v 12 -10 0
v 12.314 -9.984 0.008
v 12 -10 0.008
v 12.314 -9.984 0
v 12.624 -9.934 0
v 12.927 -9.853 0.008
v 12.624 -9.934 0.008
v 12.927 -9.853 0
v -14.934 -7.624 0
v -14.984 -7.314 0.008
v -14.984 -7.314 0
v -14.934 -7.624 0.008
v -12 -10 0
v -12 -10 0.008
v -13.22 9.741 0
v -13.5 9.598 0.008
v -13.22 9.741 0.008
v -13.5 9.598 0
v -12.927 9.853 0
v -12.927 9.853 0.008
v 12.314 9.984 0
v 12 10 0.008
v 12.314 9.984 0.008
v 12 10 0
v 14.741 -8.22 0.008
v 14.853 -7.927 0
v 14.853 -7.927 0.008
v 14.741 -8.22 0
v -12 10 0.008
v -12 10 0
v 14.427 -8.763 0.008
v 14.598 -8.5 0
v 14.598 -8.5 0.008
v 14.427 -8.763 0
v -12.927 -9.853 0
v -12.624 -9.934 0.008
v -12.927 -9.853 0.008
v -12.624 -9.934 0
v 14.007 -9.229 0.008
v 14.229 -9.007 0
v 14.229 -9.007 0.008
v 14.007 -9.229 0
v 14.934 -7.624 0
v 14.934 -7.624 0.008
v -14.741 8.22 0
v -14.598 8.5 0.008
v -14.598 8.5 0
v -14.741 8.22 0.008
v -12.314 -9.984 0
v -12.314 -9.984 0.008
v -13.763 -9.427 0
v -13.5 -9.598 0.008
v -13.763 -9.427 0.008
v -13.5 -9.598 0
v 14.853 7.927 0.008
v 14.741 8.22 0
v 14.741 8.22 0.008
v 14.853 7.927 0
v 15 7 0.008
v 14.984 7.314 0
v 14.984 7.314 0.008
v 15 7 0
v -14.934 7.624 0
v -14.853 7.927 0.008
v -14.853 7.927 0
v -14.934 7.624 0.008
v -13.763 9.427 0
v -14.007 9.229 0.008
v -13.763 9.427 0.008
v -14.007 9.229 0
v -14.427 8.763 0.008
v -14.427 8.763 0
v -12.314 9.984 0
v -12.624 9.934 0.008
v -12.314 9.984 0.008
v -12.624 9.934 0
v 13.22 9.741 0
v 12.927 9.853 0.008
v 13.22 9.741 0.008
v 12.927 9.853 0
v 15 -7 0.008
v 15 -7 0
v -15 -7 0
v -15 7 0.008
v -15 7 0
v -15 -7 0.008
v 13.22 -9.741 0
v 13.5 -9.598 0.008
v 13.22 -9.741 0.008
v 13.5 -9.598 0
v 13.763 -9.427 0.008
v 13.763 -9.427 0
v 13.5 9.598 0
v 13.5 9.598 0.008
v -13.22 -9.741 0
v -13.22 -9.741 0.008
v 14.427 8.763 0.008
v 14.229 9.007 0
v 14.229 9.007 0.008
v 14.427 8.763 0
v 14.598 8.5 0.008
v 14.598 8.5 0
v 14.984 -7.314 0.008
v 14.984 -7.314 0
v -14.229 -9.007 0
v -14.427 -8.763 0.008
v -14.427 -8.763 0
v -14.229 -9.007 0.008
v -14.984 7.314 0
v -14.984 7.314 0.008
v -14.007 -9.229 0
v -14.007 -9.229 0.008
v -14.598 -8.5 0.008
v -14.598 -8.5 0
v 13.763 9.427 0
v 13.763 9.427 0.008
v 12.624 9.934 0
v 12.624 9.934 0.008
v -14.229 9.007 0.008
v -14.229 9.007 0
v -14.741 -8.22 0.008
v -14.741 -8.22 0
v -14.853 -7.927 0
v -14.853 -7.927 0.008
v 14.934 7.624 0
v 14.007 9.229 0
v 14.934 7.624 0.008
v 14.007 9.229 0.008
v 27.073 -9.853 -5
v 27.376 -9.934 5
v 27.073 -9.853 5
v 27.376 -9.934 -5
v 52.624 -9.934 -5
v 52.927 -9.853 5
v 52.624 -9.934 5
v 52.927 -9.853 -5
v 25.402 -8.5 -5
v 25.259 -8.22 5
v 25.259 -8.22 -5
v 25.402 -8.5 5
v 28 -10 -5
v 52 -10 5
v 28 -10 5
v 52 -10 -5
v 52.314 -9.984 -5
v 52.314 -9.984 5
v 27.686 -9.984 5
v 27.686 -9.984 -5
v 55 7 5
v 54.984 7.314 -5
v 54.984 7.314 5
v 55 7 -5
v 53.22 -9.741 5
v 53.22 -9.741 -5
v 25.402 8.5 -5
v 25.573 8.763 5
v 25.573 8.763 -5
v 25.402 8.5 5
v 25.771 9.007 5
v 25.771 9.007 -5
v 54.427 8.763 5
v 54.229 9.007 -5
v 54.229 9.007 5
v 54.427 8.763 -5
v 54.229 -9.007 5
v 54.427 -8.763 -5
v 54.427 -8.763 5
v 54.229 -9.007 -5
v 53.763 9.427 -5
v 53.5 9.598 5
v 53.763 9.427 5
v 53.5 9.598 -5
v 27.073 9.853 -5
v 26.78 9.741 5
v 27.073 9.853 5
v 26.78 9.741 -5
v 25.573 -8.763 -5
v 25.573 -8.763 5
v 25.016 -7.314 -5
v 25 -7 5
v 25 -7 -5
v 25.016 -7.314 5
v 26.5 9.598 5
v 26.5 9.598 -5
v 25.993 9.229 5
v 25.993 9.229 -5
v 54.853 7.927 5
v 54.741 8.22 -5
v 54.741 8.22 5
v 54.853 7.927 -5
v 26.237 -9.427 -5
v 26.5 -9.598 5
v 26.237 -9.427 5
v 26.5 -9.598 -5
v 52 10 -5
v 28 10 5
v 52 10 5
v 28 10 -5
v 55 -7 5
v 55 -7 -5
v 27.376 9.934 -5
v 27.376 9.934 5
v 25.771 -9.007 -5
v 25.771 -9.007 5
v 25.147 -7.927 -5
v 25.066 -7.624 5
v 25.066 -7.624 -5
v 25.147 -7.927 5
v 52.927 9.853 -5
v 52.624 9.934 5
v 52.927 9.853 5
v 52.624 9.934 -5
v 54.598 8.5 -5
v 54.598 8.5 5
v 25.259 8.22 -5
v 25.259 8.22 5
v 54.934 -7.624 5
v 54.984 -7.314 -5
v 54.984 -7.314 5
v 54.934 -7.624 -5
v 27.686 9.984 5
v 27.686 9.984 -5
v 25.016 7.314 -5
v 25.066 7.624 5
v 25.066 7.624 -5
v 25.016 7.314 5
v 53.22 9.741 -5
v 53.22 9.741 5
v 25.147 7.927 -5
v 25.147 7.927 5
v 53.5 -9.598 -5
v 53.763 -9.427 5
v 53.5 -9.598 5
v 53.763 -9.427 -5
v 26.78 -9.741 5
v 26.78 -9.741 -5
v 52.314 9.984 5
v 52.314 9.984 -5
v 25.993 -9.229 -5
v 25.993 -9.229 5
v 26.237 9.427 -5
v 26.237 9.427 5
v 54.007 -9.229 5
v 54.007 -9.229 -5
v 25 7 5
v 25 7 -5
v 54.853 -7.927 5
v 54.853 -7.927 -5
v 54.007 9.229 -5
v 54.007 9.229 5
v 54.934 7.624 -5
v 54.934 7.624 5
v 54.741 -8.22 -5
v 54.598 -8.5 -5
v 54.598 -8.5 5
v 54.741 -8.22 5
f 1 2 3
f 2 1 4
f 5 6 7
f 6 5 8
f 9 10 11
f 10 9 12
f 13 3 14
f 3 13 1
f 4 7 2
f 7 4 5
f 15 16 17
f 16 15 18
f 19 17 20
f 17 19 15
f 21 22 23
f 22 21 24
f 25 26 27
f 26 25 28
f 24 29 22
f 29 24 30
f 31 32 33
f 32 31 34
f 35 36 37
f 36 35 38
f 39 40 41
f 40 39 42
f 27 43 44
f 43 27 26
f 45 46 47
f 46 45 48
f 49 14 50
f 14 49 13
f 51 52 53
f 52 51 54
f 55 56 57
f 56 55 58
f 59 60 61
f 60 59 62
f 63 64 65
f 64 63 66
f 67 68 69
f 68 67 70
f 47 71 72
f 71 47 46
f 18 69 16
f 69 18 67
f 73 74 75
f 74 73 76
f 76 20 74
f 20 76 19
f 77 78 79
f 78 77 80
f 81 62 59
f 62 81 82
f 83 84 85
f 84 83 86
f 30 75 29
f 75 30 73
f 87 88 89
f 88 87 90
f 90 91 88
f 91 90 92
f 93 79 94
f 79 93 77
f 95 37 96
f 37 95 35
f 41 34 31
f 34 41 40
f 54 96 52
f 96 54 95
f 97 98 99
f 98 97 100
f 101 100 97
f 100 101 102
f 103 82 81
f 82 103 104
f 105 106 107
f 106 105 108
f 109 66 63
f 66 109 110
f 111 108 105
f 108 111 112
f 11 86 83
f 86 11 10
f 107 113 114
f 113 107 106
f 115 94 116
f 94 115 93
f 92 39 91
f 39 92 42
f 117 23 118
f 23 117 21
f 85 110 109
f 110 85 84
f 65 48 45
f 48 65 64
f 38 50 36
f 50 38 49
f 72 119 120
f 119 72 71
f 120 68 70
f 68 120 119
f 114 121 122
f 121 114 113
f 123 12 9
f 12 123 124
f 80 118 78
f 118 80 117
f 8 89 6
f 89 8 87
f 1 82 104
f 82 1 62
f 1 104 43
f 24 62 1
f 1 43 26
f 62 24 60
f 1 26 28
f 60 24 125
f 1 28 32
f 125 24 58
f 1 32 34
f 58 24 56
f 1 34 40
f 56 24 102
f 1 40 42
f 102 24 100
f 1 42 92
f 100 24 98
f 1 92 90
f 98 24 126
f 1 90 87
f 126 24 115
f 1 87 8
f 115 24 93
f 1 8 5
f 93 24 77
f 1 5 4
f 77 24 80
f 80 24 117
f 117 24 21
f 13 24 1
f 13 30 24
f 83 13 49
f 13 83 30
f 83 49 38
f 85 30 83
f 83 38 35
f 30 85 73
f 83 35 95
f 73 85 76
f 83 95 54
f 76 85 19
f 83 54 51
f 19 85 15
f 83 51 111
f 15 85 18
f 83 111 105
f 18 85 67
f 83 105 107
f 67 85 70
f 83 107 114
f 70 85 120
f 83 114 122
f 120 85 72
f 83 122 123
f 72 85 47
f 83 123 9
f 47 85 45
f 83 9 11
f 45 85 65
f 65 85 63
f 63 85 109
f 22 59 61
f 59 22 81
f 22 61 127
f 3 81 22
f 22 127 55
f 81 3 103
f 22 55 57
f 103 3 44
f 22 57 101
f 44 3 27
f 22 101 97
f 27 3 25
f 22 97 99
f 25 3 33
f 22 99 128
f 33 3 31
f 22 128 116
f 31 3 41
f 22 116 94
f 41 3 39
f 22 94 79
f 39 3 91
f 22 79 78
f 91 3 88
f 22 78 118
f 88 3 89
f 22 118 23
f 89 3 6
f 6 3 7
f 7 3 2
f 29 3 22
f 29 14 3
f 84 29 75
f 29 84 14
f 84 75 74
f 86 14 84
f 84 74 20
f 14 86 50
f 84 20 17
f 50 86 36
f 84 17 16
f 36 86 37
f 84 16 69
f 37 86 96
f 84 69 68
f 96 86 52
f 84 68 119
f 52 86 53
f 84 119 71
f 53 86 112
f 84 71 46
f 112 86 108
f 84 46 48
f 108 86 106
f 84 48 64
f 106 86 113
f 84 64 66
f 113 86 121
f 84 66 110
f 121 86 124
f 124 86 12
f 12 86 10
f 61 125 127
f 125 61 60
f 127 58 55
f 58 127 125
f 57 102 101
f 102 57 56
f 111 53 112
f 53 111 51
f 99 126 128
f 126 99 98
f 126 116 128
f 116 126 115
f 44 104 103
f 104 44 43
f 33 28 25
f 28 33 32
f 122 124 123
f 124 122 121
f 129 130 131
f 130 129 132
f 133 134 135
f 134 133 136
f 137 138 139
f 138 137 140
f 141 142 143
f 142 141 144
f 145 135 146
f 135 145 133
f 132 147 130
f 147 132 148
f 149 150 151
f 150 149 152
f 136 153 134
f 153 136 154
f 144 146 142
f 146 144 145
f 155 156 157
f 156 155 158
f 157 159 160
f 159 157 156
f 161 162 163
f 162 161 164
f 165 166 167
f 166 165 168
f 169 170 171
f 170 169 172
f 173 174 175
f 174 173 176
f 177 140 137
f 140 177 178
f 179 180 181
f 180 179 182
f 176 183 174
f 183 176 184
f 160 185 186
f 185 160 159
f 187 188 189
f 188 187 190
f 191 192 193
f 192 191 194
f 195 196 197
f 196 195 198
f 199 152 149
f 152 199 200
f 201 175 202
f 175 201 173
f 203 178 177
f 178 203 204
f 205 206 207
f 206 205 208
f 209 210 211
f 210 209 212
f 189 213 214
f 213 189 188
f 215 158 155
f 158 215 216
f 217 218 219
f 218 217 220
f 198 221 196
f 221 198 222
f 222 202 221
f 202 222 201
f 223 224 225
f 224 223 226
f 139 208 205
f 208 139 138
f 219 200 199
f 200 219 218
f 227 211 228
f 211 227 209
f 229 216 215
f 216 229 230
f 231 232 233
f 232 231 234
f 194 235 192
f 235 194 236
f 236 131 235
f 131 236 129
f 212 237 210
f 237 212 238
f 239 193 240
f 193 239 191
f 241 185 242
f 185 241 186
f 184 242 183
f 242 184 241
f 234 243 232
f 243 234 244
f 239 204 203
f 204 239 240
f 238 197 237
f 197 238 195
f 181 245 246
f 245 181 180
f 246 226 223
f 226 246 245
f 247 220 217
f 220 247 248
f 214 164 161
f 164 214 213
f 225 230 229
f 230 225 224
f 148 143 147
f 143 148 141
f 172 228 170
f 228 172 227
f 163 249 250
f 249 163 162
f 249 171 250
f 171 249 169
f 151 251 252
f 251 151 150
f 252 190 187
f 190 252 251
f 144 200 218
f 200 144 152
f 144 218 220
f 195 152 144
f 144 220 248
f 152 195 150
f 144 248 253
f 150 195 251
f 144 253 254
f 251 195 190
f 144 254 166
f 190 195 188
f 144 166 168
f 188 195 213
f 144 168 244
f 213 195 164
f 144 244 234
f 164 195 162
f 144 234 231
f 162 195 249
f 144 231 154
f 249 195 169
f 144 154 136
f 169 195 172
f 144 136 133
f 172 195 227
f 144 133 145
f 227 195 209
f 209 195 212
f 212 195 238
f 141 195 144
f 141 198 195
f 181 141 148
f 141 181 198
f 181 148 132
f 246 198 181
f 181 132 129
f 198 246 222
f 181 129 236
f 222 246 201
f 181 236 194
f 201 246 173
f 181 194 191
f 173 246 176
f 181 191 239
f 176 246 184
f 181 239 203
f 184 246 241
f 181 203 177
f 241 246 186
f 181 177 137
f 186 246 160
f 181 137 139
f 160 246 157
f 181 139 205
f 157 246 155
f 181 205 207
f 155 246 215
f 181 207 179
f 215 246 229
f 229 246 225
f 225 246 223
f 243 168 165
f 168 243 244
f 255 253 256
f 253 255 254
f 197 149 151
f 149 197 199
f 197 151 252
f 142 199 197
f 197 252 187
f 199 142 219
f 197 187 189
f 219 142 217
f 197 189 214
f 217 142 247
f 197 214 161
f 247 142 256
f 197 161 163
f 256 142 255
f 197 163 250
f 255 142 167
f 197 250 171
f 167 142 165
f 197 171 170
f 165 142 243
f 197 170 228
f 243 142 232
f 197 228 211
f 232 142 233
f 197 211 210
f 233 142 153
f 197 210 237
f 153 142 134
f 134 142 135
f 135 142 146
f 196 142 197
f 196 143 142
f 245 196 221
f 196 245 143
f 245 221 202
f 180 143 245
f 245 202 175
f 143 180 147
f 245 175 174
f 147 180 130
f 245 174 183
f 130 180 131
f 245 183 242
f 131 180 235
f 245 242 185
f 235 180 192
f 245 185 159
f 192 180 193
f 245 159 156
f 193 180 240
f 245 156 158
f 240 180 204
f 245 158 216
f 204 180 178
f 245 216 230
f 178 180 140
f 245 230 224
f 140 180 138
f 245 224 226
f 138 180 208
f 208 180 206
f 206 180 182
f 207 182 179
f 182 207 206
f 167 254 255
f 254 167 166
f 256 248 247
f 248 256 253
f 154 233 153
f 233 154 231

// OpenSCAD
// file: ../utils/core/clip.scad
//
// NopSCADlib Copyright Chris Palmer 2018
// nop.head@gmail.com
// hydraraptor.blogspot.com
//
// This file is part of NopSCADlib.
//
// NopSCADlib is free software: you can redistribute it and/or modify it under the terms of the
// GNU General Public License as published by the Free Software Foundation, either version 3 of
// the License, or (at your option) any later version.
//
// NopSCADlib is distributed in the hope that it will be useful, but WITHOUT ANY WARRANTY;
// without even the implied warranty of MERCHANTABILITY or FITNESS FOR A PARTICULAR PURPOSE.
// See the GNU General Public License for more details.
//
// You should have received a copy of the GNU General Public License along with NopSCADlib.
// If not, see <https://www.gnu.org/licenses/>.
//

//
//! Construct arbirarily large box to partition 3D space and clip objects, useful for creating cross sections to see the inside when debugging.
//!
//! Original version by Doug Moen on the OpenSCAD forum
//
//
module box(xmin, ymin, zmin, xmax, ymax, zmax) //! Construct a box given its bounds
    polyhedron(
        [[xmin, ymin, zmin],  // 0
         [xmin, ymin, zmax],  // 1
         [xmin, ymax, zmin],  // 2
         [xmin, ymax, zmax],  // 3
         [xmax, ymin, zmin],  // 4
         [xmax, ymin, zmax],  // 5
         [xmax, ymax, zmin],  // 6
         [xmax, ymax, zmax]], // 7
        [[7,5,1,3],  // top
         [2,0,4,6],  // bottom
         [5,4,0,1],  // front
         [3,2,6,7],  // back
         [5,7,6,4],  // right
         [0,2,3,1]]  // left
    );

module clip(xmin = -inf, ymin = -inf, zmin = -inf, xmax = inf, ymax = inf, zmax = inf) //! Clip child to specified boundaries
    render() intersection() {
        children();

        box(xmin, ymin, zmin, xmax, ymax, zmax);
    }
// file: ../utils/core/rounded_rectangle.scad
//
// NopSCADlib Copyright Chris Palmer 2018
// nop.head@gmail.com
// hydraraptor.blogspot.com
//
// This file is part of NopSCADlib.
//
// NopSCADlib is free software: you can redistribute it and/or modify it under the terms of the
// GNU General Public License as published by the Free Software Foundation, either version 3 of
// the License, or (at your option) any later version.
//
// NopSCADlib is distributed in the hope that it will be useful, but WITHOUT ANY WARRANTY;
// without even the implied warranty of MERCHANTABILITY or FITNESS FOR A PARTICULAR PURPOSE.
// See the GNU General Public License for more details.
//
// You should have received a copy of the GNU General Public License along with NopSCADlib.
// If not, see <https://www.gnu.org/licenses/>.
//

//
//! Rectangle with rounded corners.
//
module rounded_square(size, r, center = true) //! Like ```square()``` but with with rounded corners
{
    $fn = r2sides4n(r);
    offset(r) offset(-r) square(size, center = center);
}

module rounded_rectangle(size, r, center = true, xy_center = true) //! Like ```cube()``` but corners rounded in XY plane and separate centre options for xy and z.
{
    linear_extrude(size[2], center = center)
        rounded_square([size[0], size[1]], r, xy_center);
}
// file: ../utils/core/teardrops.scad
//
// NopSCADlib Copyright Chris Palmer 2018
// nop.head@gmail.com
// hydraraptor.blogspot.com
//
// This file is part of NopSCADlib.
//
// NopSCADlib is free software: you can redistribute it and/or modify it under the terms of the
// GNU General Public License as published by the Free Software Foundation, either version 3 of
// the License, or (at your option) any later version.
//
// NopSCADlib is distributed in the hope that it will be useful, but WITHOUT ANY WARRANTY;
// without even the implied warranty of MERCHANTABILITY or FITNESS FOR A PARTICULAR PURPOSE.
// See the GNU General Public License for more details.
//
// You should have received a copy of the GNU General Public License along with NopSCADlib.
// If not, see <https://www.gnu.org/licenses/>.
//

//
//! For making horizontal holes that don't need support material.
//! Small holes can get away without it, but they print better with truncated teardrops.
//
module teardrop(h, r, center = true, truncate = true, chamfer = 0) { //! For making horizontal holes that don't need support material, set ```truncate = false``` to make traditional RepRap teardrops that don't even need bridging
    module teardrop_2d(r, truncate) {
        hull() {
            circle4n(r);
            if(truncate)
                translate([0, r / 2])
                    square([2 * r * (sqrt(2) - 1), r], center = true);
            else
                polygon([[0, 0], [eps, 0], [0, r * sqrt(2)]]);
        }
    }

    render(convexity = 5)
        extrude_if(h, center)
            teardrop_2d(r, truncate);

    teardrop_chamfer(h, center, chamfer) {
        linear_extrude(eps, center = true)
            teardrop_2d(r + chamfer / 2, truncate);
        translate_z(-chamfer / 2)
            linear_extrude(eps, center = true)
                teardrop_2d(r, truncate);
    }
}

module semi_teardrop(h, r, d = undef, center = true, chamfer = 0) { //! A semi teardrop in the positive Y domain
    module semi_teardrop_2d(r, d) {
        intersection() {
            R = is_undef(d) ? r : d / 2;
            teardrop(r = R, h = 0);

            sq = R + 1;
            translate([-sq, 0])
                square([2 * sq, sq]);
        }
    }

    render(convexity = 5)
        extrude_if(h, center)
            semi_teardrop_2d(r, d);

    teardrop_chamfer(h, center, chamfer) {
        linear_extrude(eps, center = true)
            semi_teardrop_2d(r + chamfer / 2, d);
        translate_z(-chamfer / 2)
            linear_extrude(eps, center = true)
                semi_teardrop_2d(r, d);
    }
}

module teardrop_plus(h, r, center = true, truncate = true, chamfer = 0) //! Slightly bigger teardrop to allow for the 3D printing staircase effect
    teardrop(h, r + layer_height / 4, center, truncate, chamfer);

module tearslot(h, r, w, center = true, chamfer = 0) { //! A horizontal slot that doesn't need support material
    module tearslot_2d(r, w) {
        hull() {
            translate([-w / 2, 0]) teardrop(r = r, h = 0);
            translate([w / 2, 0]) teardrop(r = r, h = 0);
        }
    }

    extrude_if(h, center)
        tearslot_2d(r, w);

    teardrop_chamfer(h, center, chamfer) {
        linear_extrude(eps, center = true)
            tearslot_2d(r + chamfer / 2, w);
        translate_z(-chamfer / 2)
            linear_extrude(eps, center = true)
                tearslot_2d(r, w);
    }
}

module vertical_tearslot(h, r, l, center = true, chamfer = 0) { //! A vertical slot that doesn't need support material
    module vertical_tearslot_2d(r, l) {
        hull() {
            translate([0,  l / 2]) teardrop(0, r, true);
            translate([0, -l / 2]) circle4n(r);
        }
    }

    extrude_if(h, center)
        vertical_tearslot_2d(r, l);

    teardrop_chamfer(h, center, chamfer) {
        linear_extrude(eps, center = true)
            vertical_tearslot_2d(r + chamfer / 2, l);
        translate_z(-chamfer / 2)
            linear_extrude(eps, center = true)
                vertical_tearslot_2d(r, l);
    }
}

module teardrop_chamfer(h, center, chamfer) { //! Helper module for adding chamfer to a teardrop
    if(h && chamfer)
        translate_z(center ? 0 : h / 2)
            for(m = [0, 1])
                mirror([0, 0, m])
                    translate_z((h - eps ) / 2)
                        hull()
                            children();
}
// file: ../utils/core/polyholes.scad
//
// NopSCADlib Copyright Chris Palmer 2018
// nop.head@gmail.com
// hydraraptor.blogspot.com
//
// This file is part of NopSCADlib.
//
// NopSCADlib is free software: you can redistribute it and/or modify it under the terms of the
// GNU General Public License as published by the Free Software Foundation, either version 3 of
// the License, or (at your option) any later version.
//
// NopSCADlib is distributed in the hope that it will be useful, but WITHOUT ANY WARRANTY;
// without even the implied warranty of MERCHANTABILITY or FITNESS FOR A PARTICULAR PURPOSE.
// See the GNU General Public License for more details.
//
// You should have received a copy of the GNU General Public License along with NopSCADlib.
// If not, see <https://www.gnu.org/licenses/>.
//

//
//! A method of making 3D printed holes come out the right size regardless of the printer, providing
//! it gets the linear dimensions right. See <https://hydraraptor.blogspot.com/2011/02/polyholes.html>
//!
//! The module provides `poly_circle()`, `poly_cylinder()` and `poly_ring()` that is useful for making printed washers and pillars.
//
function sides(r) = max(round(4 * r), 3);                                       //! Optimium number of sides for specified radius
function corrected_radius(r, n = 0)   = r / cos(180 / (n ? n : sides(r)));      //! Adjusted radius to make flats lie on the circle
function corrected_diameter(d, n = 0) = d / cos(180 / (n ? n : sides(d / 2)));  //! Adjusted diameter to make flats lie on the circle

module poly_circle(r, sides = 0) { //! Make a circle adjusted to print the correct size
    n = sides ? sides : sides(r);
    circle(r = corrected_radius(r,n), $fn = n);
}

module poly_cylinder(r, h, center = false, sides = 0) //! Make a cylinder adjusted to print the correct size
    extrude_if(h, center)
        poly_circle(r, sides);

module poly_ring(or, ir) { //! Make a 2D ring adjusted to have the correct internal radius
    cir = corrected_radius(ir);
    filaments = (or - cir) / extrusion_width;
    if(filaments > 3 + eps)
        difference() {
            circle(or);

            poly_circle(ir);
        }
    else
        if(filaments >= 2)
            difference() {
                offset(or - cir)
                    poly_circle(ir);

                poly_circle(ir);
            }
            else
                difference() {
                    poly_circle(or);

                    offset(-squeezed_wall)
                        poly_circle(or);
                }
}

module poly_tube(or, ir, h, center = false) //! Make a tube adjusted to have the correct internal radius
    extrude_if(h, center)
        poly_ring(or, ir);

module drill(r, h = 100) //! Make a cylinder for drilling holes suitable for CNC routing, set h = 0 for circle
    extrude_if(h)
        circle(r = corrected_radius(r, r2sides(r)));
//
// Horizontal slot
//
module slot(r, l, h = 100) //! Make a horizontal slot suitable for CNC routing, set h = 0 for 2D version
    extrude_if(h)
        hull() {
            translate([l / 2,0])
                drill(r, 0);

            translate([-l / 2,0])
                drill(r, 0);
        }
// file: ../utils/core/bom.scad
//
// NopSCADlib Copyright Chris Palmer 2018
// nop.head@gmail.com
// hydraraptor.blogspot.com
//
// This file is part of NopSCADlib.
//
// NopSCADlib is free software: you can redistribute it and/or modify it under the terms of the
// GNU General Public License as published by the Free Software Foundation, either version 3 of
// the License, or (at your option) any later version.
//
// NopSCADlib is distributed in the hope that it will be useful, but WITHOUT ANY WARRANTY;
// without even the implied warranty of MERCHANTABILITY or FITNESS FOR A PARTICULAR PURPOSE.
// See the GNU General Public License for more details.
//
// You should have received a copy of the GNU General Public License along with NopSCADlib.
// If not, see <https://www.gnu.org/licenses/>.
//

//
//! Bill Of Materials generation via echo and the ```bom.py``` script. Also handles exploded assembly views and posing. Assembly instructions can precede the module
//! definition that makes the assembly.
//!
//! The example below shows how to define a vitamin and incorporate it into an assembly with sub-assemblies and make an exploded view. The resulting flat BOM is shown but
//! heirachical BOMs are also generated for real projects.
//
function bom_mode(n = 1) = $_bom >= n && (is_undef($on_bom) || $on_bom);  //! Current BOM mode, 0 = none, 1 = printed and routed parts and assemblies, 2 includes vitamins as well
function exploded() = is_undef($exploded_parent) ? $exploded : 0;   //! Returns the value of ```$exploded``` if it is defined, else ```0```
function show_supports() = !$preview || exploded();                 //! True if printed support material should be shown

module no_explode() let($exploded_parent = true) children();        //! Prevent children being exploded
module no_pose() let($posed = true) children();                     //! Force children not to be posed even if parent is

module explode(d, explode_children = false, offset = [0,0,0]) {     //! Explode children by specified Z distance or vector ```d```, option to explode grand children
    v = is_list(d) ? d : [0, 0, d];
    o = is_list(offset) ? offset : [0, 0, offset];
    if($exploded && is_undef($exploded_parent) && norm(v)) {
        translate(o)                                                // Draw the line first in case the child is transparent
            color("yellow") hull() {
                sphere(0.2);

                translate(v * $exploded)
                    sphere(0.2);
            }

        translate(v * $exploded)
            let($exploded_parent = explode_children ? undef : true)
                children();
    }
    else
        children();
}

module pose(a = [55, 0, 25], t = [0, 0, 0], exploded = undef)       //! Pose an STL or assembly for rendering to png by specifying rotation ```a``` and translation ```t```, ```exploded = true for``` just the exploded view or ```false``` for unexploded only.
    if(is_undef($pose) || !is_undef($posed) || (!is_undef(exploded) && exploded != !!exploded()))
        children();
    else
        let($posed = true) // only pose the top level
            rotate([55, 0, 25])
                rotate([-a.x, 0, 0])
                    rotate([0, -a.y, 0])
                        rotate([0, 0, -a.z])
                            translate(-t)
                                children();

module pose_hflip(exploded = undef)       //! Pose an STL or assembly for rendering to png by flipping around the Y axis, ```exploded = true for``` just the exploded view or ```false``` for unexploded only.
    if(is_undef($pose) || !is_undef($posed) || (!is_undef(exploded) && exploded != !!exploded()))
        children();
    else
        let($posed = true) // only pose the top level
            hflip()
                children();

module pose_vflip(exploded = undef)       //! Pose an STL or assembly for rendering to png by flipping around the X axis, ```exploded = true for``` just the exploded view or ```false``` for unexploded only.
    if(is_undef($pose) || !is_undef($posed) || (!is_undef(exploded) && exploded != !!exploded()))
        children();
    else
        let($posed = true) // only pose the top level
            vflip()
                children();


module assembly(name) {                 //! Name an assembly that will appear on the BOM, there needs to a module named ```<name>_assembly``` to make it
    if(bom_mode())
        echo(str("~", name, "_assembly{"));

    no_pose()
        if(is_undef($child_assembly))
            let($child_assembly = true)
                children();
        else
            no_explode()
                children();

    if(bom_mode())
        echo(str("~}", name, "_assembly"));
}

module stl(name) {                      //! Name an stl that will appear on the BOM, there needs to a module named ```<name>_stl``` to make it
    if(bom_mode())
        echo(str("~", name, ".stl"));
}

module dxf(name) {                      //! Name a dxf that will appear on the BOM, there needs to a module named ```<name>_dxf``` to make it
    if(bom_mode())
        echo(str("~", name, ".dxf"));
}

function value_string(value) = is_string(value) ? str("\"", value, "\"") : str(value); //! Convert ```value``` to a string or quote it if it is already a string

function arg(value, default, name = "") =   //! Create string for arg if not default, helper for ```vitamin()```
    value == default ? ""
                     : name ? str(", ", name, " = ", value_string(value))
                            : str(", ", value_string(value));

module vitamin(description) {                //! Describe a vitamin for the BOM entry and precede it with a module call that creates it, eg. "wigit(42): Type 42 widget"
    if(bom_mode(2))
        echo(str("~", description, !is_undef($hidden) ? " - not shown" : ""));
}

module not_on_bom(on = false)               //! Specify the following child parts are not on the BOM, for example when they are on a PCB that comes assembled
    let($on_bom = on)
        children();

module hidden()                             //! Make item invisible, except on the BOM
    scale(1 / sqr(1024))
        let($hidden = true)
            children();
// file: ../utils/core/sphere.scad
//
// NopSCADlib Copyright Chris Palmer 2018
// nop.head@gmail.com
// hydraraptor.blogspot.com
//
// This file is part of NopSCADlib.
//
// NopSCADlib is free software: you can redistribute it and/or modify it under the terms of the
// GNU General Public License as published by the Free Software Foundation, either version 3 of
// the License, or (at your option) any later version.
//
// NopSCADlib is distributed in the hope that it will be useful, but WITHOUT ANY WARRANTY;
// without even the implied warranty of MERCHANTABILITY or FITNESS FOR A PARTICULAR PURPOSE.
// See the GNU General Public License for more details.
//
// You should have received a copy of the GNU General Public License along with NopSCADlib.
// If not, see <https://www.gnu.org/licenses/>.
//

//! Redefines `sphere()` to always have a vertex on all six half axes I.e. vertices at the poles and the equator and `$fn` a multiple of four.
//! This ensures `hull` and `minkowski` results have the correct dimensions when spheres are placed at the corners.

module sphere(r = 1, d = undef) {                   //! Override ```sphere``` so that has vertices on all three axes. Has the advantage of giving correct dimensions when hulled
    R = is_undef(d) ? r : d / 2;
    rotate_extrude($fn = r2sides4n(R))
        rotate(-90)
            semi_circle(R);
}
// file: ../utils/core/global.scad
//
// NopSCADlib Copyright Chris Palmer 2018
// nop.head@gmail.com
// hydraraptor.blogspot.com
//
// This file is part of NopSCADlib.
//
// NopSCADlib is free software: you can redistribute it and/or modify it under the terms of the
// GNU General Public License as published by the Free Software Foundation, either version 3 of
// the License, or (at your option) any later version.
//
// NopSCADlib is distributed in the hope that it will be useful, but WITHOUT ANY WARRANTY;
// without even the implied warranty of MERCHANTABILITY or FITNESS FOR A PARTICULAR PURPOSE.
// See the GNU General Public License for more details.
//
// You should have received a copy of the GNU General Public License along with NopSCADlib.
// If not, see <https://www.gnu.org/licenses/>.
//

//
//! Global constants, functions and modules. This file is used directly or indirectly in every scad file.
//
include <../../global_defs.scad>

function inch(x) = x * 25.4;                                                        //! Inch to mm conversion (For fractional inches, 'inch(1 + 7/8)' will work as expected.)
function foot(x) = x * 25.4 * 12;                                                   //! Foot to mm conversion
function yard(x) = x * 25.4 * 12 * 3;                                               //! Yard to mm conversion
function mm(x)   = x;                                                               //! Explicit mm specified
function cm(x)   = x * 10.0;                                                        //! cm to mm conversion
function m(x)    = x * 1000.0;                                                      //! m to mm conversion

function sqr(x) = x * x;                                                            //! Returns the square of ```x```
function echoit(x) = echo(x) x;                                                     //! Echo expression and return it, useful for debugging
function in(list, x) = !!len([for(v = list) if(v == x) true]);                      //! Returns true if ```x``` is an element in the ```list```
function Len(x) = is_list(x) ? len(x) : 0;                                          //! Returns the length of a list or 0 if ```x``` is not a list
function r2sides(r) = $fn ? $fn : ceil(max(min(360/ $fa, r * 2 * PI / $fs), 5));    //! Replicates the OpenSCAD logic to calculate the number of sides from the radius
function r2sides4n(r) = floor((r2sides(r) + 3) / 4) * 4;                            //! Round up the number of sides to a multiple of 4 to ensure points land on all axes

module translate_z(z) translate([0, 0, z]) children();                              //! Shortcut for Z only translations
module vflip() rotate([180, 0, 0]) children();                                      //! Invert children by doing a 180&deg; flip around the X axis
module hflip() rotate([0, 180, 0]) children();                                      //! Invert children by doing a 180&deg; flip around the Y axis
module ellipse(xr, yr) scale([1, yr / xr]) circle4n(xr);                            //! Draw an ellipse

module extrude_if(h, center = true)                 //! Extrudes 2D object to 3D when ```h``` is nonzero, otherwise leaves it 2D
    if(h)
        linear_extrude(h, center = center, convexity = 2) // 3D
            children();
    else
        children();                                 // 2D

module circle4n(r, d = undef) {                     //! Circle with multiple of 4 vertices
    R = is_undef(d) ? r : d / 2;
    circle(R, $fn = r2sides4n(R));
}

module semi_circle(r, d = undef)                    //! A semi circle in the positive Y domain
    intersection() {
        R = is_undef(d) ? r : d / 2;
        circle4n(R);

        sq = R + 1;
        translate([-sq, 0])
            square([2 * sq, sq]);
    }

module right_triangle(width, height, h, center = true) //! A right angled triangle with the 90&deg; corner at the origin. 3D when ```h``` is nonzero, otherwise 2D
    extrude_if(h, center = center)
        polygon(points = [[0,0], [width, 0], [0, height]]);

include <sphere.scad>
include <bom.scad>
include <polyholes.scad>
include <teardrops.scad>
include <rounded_rectangle.scad>
include <clip.scad>
// file: ../global_defs.scad
//
// NopSCADlib Copyright Chris Palmer 2018
// nop.head@gmail.com
// hydraraptor.blogspot.com
//
// This file is part of NopSCADlib.
//
// NopSCADlib is free software: you can redistribute it and/or modify it under the terms of the
// GNU General Public License as published by the Free Software Foundation, either version 3 of
// the License, or (at your option) any later version.
//
// NopSCADlib is distributed in the hope that it will be useful, but WITHOUT ANY WARRANTY;
// without even the implied warranty of MERCHANTABILITY or FITNESS FOR A PARTICULAR PURPOSE.
// See the GNU General Public License for more details.
//
// You should have received a copy of the GNU General Public License along with NopSCADlib.
// If not, see <https://www.gnu.org/licenses/>.
//

//
// This file included directly or indirectly in every scad file.
//
// This scheme allows the following:
//  bom defaults to 0
//  Setting $bom on the command line or in the main file before including lib.scad overrides it everywhere.
//  Setting $bom after including lib overrides bom in the libs but not in the local file.
//  Setting $_bom in the local file overrides it in the local file but not in the libs.
//
//function is_undef(x) = x == undef;

$_bom           = is_undef($bom)             ? 0      : $bom;             // 0 no bom, 1 assemblies and stls, 2 vitamins as well
$exploded       = is_undef($explode)         ? 0      : $explode;         // 1 for exploded view
layer_height    = is_undef($layer_height)    ? 0.25   : $layer_height;    // layer heigth when printing
extrusion_width = is_undef($extrusion_width) ? 0.5    : $extrusion_width; // filament width when printing
nozzle          = is_undef($nozzle)          ? 0.45   : $nozzle;          // 3D printer nozzle
cnc_bit_r       = is_undef($cnc_bit_r)       ? 1.2    : $cnc_bit_r;       // miniumum tool radius when milling 2D objects
pp1_colour      = is_undef($pp1_colour)      ? [0, 146/255, 0] : $pp1_colour; // printed part colour 1, RepRap logo colour
pp2_colour      = is_undef($pp2_colour)      ? "red"  : $pp2_colour;      // printed part colour 2
pp3_colour      = is_undef($pp3_colour)      ? "blue" : $pp3_colour;      // printed part colour 3
pp4_colour      = is_undef($pp4_colour)      ? "darkorange" : $pp4_colour;// printed part colour 4
show_rays       = is_undef($show_rays)       ? false  : $show_rays;       // show camera sight lines and light direction
show_threads    = is_undef($show_threads)    ? false  : $show_threads;    // show screw threads

// Minimum wall is about two filaments wide but we extrude it closer to get better bonding
squeezed_wall = $preview ? 2 * extrusion_width - layer_height * (1 - PI / 4)
                         : extrusion_width - layer_height / 2 + nozzle / 2 + extrusion_width / 2;

inf = 1e10;      // very big
eps = 1/128;     // small fudge factor to stop CSG barfing on coincident faces.
$fa = 6;
$fs = extrusion_width / 2;

function round_to_layer(z) = ceil(z / layer_height) * layer_height;
// Some additional named colors
grey20                          = [0.2, 0.2, 0.2];
grey30                          = [0.3, 0.3, 0.3];
grey40                          = [0.4, 0.4, 0.4];
grey50                          = [0.5, 0.5, 0.5];
grey60                          = [0.6, 0.6, 0.6];
grey70                          = [0.7, 0.7, 0.7];
grey80                          = [0.8, 0.8, 0.8];
grey90                          = [0.9, 0.9, 0.9];
gold                            = [255/255, 215/255, 0/255];
brass                           = [255/255, 220/255, 100/255];
silver                          = [0.75, 0.75, 0.75];

/*
 * Enums
 */
//
// Screws
//
hs_cap    = 0;
hs_pan    = 1;
hs_cs     = 2;     // counter sunk
hs_hex    = 3;
hs_grub   = 4;     // pulley set screw
hs_cs_cap = 5;
hs_dome   = 6;
//
// Hot end descriptions
//
jhead   = 1;
e3d     = 2;
//
// Face enumeration
//
f_bottom = 0;
f_top    = 1;
f_left   = 2;
f_right  = 3;
f_front  = 4;
f_back   = 5;
// file: ../utils/core/core.scad
//
// NopSCADlib Copyright Chris Palmer 2018
// nop.head@gmail.com
// hydraraptor.blogspot.com
//
// This file is part of NopSCADlib.
//
// NopSCADlib is free software: you can redistribute it and/or modify it under the terms of the
// GNU General Public License as published by the Free Software Foundation, either version 3 of
// the License, or (at your option) any later version.
//
// NopSCADlib is distributed in the hope that it will be useful, but WITHOUT ANY WARRANTY;
// without even the implied warranty of MERCHANTABILITY or FITNESS FOR A PARTICULAR PURPOSE.
// See the GNU General Public License for more details.
//
// You should have received a copy of the GNU General Public License along with NopSCADlib.
// If not, see <https://www.gnu.org/licenses/>.
//

//
// Include this file to use the miniumum library
//
include <../../global_defs.scad>
//
// Global functions and modules
//
use <global.scad>

module use_stl(name) {               //! Import an STL to make a build platter
    stl(name);

    import(str("../stls/", name, ".stl"));
}

module use_dxf(name) {               //! Import a DXF to make a build panel
    dxf(name);

    import(str("../dxfs/", name, ".dxf"));
}
// main file
//
// NopSCADlib Copyright Chris Palmer 2018
// nop.head@gmail.com
// hydraraptor.blogspot.com
//
// This file is part of NopSCADlib.
//
// NopSCADlib is free software: you can redistribute it and/or modify it under the terms of the
// GNU General Public License as published by the Free Software Foundation, either version 3 of
// the License, or (at your option) any later version.
//
// NopSCADlib is distributed in the hope that it will be useful, but WITHOUT ANY WARRANTY;
// without even the implied warranty of MERCHANTABILITY or FITNESS FOR A PARTICULAR PURPOSE.
// See the GNU General Public License for more details.
//
// You should have received a copy of the GNU General Public License along with NopSCADlib.
// If not, see <https://www.gnu.org/licenses/>.
//

include <../utils/core/core.scad>

module rounded_rectangles() {
    linear_extrude(eps)
        rounded_square([30, 20], 3);

    translate([40, 0])
        rounded_rectangle([30, 20, 10], 3);
}

rounded_rectangles();
